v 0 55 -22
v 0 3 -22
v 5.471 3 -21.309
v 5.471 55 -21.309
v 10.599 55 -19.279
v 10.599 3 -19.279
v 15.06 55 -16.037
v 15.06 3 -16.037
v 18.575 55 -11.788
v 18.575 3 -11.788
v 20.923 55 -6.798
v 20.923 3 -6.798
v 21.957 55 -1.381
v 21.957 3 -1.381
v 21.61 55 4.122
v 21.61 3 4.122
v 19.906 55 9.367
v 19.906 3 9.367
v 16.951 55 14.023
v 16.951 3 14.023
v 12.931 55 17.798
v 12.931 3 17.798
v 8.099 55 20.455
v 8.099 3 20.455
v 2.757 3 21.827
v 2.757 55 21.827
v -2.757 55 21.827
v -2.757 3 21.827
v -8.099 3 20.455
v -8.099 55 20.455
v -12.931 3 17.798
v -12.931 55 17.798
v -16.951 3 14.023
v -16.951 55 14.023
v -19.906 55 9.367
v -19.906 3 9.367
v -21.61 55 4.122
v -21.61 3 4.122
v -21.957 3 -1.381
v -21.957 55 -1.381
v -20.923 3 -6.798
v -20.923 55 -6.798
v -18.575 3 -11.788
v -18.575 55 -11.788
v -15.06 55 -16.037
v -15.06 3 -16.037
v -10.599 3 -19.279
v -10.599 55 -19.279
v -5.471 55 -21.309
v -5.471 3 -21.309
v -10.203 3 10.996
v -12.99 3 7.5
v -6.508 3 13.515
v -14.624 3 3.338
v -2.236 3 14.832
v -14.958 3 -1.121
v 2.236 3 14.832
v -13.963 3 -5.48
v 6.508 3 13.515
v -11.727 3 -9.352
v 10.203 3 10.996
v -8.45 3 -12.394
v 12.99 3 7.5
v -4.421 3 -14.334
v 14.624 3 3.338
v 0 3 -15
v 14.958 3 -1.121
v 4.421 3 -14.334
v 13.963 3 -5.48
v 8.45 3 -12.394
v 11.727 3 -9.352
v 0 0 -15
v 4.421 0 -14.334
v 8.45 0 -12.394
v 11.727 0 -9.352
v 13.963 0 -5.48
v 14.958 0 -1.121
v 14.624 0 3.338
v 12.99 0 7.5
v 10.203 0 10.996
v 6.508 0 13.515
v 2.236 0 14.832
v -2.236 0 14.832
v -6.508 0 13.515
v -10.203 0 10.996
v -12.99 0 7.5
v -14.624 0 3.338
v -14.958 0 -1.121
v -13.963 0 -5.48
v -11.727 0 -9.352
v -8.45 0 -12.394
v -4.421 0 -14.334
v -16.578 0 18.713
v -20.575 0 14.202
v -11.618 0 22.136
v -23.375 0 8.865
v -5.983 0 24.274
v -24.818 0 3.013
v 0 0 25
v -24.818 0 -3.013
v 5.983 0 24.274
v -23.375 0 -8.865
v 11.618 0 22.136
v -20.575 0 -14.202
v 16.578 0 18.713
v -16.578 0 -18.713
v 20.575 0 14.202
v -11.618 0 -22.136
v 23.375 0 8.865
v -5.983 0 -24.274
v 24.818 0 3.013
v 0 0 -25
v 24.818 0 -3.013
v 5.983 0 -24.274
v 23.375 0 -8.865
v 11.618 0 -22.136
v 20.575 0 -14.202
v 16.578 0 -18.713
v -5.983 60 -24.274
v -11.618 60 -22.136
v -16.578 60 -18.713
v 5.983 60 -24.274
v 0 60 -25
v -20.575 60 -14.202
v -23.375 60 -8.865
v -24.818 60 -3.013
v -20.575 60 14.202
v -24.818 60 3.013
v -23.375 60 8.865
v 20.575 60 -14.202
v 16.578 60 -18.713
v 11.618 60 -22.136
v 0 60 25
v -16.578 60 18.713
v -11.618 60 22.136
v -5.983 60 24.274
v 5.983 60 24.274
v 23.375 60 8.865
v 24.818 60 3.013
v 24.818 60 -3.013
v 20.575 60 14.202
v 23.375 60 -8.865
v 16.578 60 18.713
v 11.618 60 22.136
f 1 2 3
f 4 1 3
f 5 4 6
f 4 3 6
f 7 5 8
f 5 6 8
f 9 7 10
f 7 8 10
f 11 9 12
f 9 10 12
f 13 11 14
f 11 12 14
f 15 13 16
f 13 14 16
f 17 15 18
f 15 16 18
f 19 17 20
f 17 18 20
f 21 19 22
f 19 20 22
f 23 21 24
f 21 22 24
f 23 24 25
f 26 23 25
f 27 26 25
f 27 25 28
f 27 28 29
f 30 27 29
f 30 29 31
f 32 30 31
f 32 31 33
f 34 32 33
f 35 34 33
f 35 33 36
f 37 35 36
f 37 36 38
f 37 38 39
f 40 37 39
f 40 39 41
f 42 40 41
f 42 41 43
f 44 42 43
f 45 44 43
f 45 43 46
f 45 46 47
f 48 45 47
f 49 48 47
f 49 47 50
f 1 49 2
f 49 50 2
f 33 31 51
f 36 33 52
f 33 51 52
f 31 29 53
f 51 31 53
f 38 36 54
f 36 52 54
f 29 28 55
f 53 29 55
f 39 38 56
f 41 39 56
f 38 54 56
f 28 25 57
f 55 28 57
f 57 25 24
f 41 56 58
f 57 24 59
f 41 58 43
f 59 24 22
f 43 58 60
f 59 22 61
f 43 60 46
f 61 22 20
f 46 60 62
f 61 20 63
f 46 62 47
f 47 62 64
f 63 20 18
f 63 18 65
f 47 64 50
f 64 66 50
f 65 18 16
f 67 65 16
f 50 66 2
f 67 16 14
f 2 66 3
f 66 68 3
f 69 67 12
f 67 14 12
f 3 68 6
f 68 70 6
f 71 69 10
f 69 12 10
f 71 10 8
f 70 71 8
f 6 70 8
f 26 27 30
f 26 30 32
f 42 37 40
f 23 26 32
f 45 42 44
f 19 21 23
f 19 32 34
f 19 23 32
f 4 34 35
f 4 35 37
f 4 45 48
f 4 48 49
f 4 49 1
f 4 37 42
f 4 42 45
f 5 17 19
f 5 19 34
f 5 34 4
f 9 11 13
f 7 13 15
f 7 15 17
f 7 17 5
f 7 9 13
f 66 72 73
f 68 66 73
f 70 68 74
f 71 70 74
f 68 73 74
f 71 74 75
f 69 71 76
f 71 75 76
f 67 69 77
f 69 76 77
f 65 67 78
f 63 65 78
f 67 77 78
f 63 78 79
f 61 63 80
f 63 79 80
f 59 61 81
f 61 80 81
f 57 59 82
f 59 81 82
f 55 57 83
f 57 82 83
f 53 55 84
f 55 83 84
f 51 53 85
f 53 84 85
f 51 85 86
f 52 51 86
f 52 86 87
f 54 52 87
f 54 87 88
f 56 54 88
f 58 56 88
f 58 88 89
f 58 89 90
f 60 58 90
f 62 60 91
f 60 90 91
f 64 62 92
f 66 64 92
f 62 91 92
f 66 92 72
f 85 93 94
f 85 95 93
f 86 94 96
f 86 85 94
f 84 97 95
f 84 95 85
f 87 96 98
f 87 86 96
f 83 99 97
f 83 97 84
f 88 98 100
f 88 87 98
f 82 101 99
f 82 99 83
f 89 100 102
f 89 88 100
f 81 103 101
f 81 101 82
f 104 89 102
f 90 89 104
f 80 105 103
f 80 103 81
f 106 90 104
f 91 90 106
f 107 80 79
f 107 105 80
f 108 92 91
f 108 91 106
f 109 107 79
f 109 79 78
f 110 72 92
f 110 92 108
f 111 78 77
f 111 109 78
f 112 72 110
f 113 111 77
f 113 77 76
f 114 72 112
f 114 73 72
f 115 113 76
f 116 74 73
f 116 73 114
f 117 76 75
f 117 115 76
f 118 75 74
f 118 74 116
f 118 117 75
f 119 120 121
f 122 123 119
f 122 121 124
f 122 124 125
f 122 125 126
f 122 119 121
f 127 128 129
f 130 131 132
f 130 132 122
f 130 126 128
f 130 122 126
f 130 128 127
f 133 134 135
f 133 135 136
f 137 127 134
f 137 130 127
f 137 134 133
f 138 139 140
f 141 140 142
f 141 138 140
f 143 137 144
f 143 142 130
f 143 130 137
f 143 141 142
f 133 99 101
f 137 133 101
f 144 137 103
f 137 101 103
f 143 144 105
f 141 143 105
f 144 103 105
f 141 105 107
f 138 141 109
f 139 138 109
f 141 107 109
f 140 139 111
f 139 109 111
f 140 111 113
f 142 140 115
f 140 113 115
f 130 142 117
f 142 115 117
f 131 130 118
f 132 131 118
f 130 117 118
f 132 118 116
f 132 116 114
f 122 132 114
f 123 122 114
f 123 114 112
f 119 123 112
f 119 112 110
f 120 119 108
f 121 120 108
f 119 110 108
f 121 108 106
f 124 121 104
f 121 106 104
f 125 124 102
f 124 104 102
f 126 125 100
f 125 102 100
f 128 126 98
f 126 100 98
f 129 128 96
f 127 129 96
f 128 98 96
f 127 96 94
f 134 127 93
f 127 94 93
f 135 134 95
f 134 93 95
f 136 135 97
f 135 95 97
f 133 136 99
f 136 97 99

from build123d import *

# Parameters (mm, degrees)
SKETCH_1_R          = 25
EXTRUDE_1_DEPTH     = 60
SKETCH_2_R          = 22
CUT_EXTRUDE_1_DEPTH = 55
SKETCH_3_R          = 22
SKETCH_3_R_2        = 15
EXTRUDE_2_DEPTH     = 3


with BuildPart() as part:
    # 草图1 → 凸台-拉伸1 (new body)
    with BuildSketch(Plane(origin=(0, 0, 0), x_dir=(1, 0, 0), z_dir=(0, 1, 0))):
        with Locations(Location((0, 0, 0), (0, 0, 270))):
            Circle(SKETCH_1_R)
    extrude(amount=EXTRUDE_1_DEPTH)

    # 草图2 → 切除-拉伸1 (cut)
    with BuildSketch(Plane.XZ):
        with Locations(Location((0, 0, 0), (0, 0, 270))):
            Circle(SKETCH_2_R)
    extrude(amount=-CUT_EXTRUDE_1_DEPTH, mode=Mode.SUBTRACT)

    # 草图3 → 凸台-拉伸2 (add)
    with BuildSketch(Plane.XZ):
        with Locations(Location((0, 0, 0), (0, 0, 270))):
            Circle(SKETCH_3_R)
        with Locations(Location((0, 0, 0), (0, 0, 270))):
            Circle(SKETCH_3_R_2, mode=Mode.SUBTRACT)
    extrude(amount=-EXTRUDE_2_DEPTH)


solid = part.part
